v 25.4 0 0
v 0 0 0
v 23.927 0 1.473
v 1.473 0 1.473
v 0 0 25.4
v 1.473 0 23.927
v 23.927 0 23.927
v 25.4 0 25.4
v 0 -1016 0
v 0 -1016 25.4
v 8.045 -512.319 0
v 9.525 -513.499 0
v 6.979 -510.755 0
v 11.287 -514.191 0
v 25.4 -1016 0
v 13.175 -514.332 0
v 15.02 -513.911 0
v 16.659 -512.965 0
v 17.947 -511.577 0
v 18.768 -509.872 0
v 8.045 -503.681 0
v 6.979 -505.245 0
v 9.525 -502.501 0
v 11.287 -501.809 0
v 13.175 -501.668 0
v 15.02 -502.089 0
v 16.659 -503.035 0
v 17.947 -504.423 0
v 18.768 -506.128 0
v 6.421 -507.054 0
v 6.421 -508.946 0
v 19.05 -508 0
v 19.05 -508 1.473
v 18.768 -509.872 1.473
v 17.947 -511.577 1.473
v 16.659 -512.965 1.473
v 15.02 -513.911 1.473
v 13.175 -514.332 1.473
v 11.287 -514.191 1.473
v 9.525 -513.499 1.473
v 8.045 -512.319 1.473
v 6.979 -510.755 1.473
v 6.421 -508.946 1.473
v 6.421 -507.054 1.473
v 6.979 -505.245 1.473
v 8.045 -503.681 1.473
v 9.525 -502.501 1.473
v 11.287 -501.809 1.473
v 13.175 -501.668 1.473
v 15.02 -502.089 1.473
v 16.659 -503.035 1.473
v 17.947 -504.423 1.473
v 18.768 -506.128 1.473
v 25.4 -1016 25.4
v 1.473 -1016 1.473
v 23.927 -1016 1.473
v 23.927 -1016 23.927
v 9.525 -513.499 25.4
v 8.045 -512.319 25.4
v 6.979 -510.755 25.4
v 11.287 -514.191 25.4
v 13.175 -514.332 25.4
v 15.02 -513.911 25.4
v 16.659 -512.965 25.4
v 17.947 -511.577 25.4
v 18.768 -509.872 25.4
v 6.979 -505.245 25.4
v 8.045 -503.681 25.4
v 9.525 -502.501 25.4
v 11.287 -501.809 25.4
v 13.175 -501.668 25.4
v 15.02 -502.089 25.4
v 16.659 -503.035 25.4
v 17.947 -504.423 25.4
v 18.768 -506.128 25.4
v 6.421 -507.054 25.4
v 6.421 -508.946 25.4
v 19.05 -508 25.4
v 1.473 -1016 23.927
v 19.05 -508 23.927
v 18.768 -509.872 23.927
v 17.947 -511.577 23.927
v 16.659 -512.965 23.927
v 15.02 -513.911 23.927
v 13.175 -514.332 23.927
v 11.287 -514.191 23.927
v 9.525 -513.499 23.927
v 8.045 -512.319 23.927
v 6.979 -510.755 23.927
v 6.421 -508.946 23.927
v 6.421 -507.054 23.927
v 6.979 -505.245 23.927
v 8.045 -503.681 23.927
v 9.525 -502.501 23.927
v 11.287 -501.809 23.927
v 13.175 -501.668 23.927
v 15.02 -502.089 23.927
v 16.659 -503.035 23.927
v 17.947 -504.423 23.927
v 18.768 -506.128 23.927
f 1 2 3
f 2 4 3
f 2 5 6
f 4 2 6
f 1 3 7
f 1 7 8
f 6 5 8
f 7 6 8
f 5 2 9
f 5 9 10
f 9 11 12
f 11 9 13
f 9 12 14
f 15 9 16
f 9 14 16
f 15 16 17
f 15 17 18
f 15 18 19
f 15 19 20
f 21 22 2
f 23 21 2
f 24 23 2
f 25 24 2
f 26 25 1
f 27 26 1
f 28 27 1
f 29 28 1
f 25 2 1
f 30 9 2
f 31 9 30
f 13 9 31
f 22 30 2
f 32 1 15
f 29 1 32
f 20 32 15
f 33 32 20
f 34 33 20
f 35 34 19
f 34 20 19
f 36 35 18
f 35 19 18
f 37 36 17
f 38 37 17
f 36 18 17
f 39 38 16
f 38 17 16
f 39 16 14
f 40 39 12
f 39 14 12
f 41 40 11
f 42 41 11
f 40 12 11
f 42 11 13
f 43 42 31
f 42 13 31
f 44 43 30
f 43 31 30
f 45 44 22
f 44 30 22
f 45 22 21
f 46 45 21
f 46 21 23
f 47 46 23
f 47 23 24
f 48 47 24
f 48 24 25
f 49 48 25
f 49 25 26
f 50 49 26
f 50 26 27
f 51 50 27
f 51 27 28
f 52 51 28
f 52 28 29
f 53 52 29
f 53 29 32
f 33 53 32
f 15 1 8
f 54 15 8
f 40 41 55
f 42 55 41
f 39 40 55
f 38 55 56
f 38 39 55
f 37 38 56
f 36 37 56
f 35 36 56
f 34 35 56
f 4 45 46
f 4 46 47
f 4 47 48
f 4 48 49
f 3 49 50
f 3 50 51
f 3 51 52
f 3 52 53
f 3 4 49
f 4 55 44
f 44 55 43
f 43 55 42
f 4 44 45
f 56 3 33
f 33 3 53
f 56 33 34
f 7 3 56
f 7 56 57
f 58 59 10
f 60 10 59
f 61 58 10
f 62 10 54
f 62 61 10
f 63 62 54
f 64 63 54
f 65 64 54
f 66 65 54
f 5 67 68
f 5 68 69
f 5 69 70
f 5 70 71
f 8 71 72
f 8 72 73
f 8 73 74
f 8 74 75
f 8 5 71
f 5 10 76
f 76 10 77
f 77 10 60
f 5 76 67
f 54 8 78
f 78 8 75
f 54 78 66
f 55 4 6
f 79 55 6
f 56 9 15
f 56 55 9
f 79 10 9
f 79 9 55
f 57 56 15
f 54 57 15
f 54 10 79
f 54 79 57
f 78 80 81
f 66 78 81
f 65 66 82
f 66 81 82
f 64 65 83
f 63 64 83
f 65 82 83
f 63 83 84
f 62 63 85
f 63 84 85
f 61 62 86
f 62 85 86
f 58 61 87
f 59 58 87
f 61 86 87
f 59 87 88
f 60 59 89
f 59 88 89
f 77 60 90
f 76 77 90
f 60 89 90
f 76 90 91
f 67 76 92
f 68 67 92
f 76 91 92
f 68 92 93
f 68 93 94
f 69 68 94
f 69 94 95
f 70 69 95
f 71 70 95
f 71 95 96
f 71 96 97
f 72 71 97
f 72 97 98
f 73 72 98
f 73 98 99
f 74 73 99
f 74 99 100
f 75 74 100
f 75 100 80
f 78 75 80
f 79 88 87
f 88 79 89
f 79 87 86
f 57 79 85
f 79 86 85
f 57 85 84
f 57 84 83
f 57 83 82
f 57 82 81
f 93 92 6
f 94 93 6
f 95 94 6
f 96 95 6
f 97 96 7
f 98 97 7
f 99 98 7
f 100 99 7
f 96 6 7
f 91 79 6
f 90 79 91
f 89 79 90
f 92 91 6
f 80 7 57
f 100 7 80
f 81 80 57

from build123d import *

# Parameters (mm, degrees)
F0_W     = 25.4
F0_H     = 25.4
F0_W_2   = 22.4536
F0_H_2   = 22.4536
F1_DEPTH = 1016
F2_R     = 6.35
F3_DEPTH = 25.401


with BuildPart() as f1:
    # F0 (on Front) → F1 (new body)
    with BuildSketch(Plane.XZ):
        with Locations((12.7, 12.7)):
            Rectangle(F0_W, F0_H)
        with Locations((12.7, 12.7)):
            Rectangle(F0_W_2, F0_H_2, mode=Mode.SUBTRACT)
    extrude(amount=F1_DEPTH)

    # F2 (on face) → F3 (cut, through all)
    with BuildSketch(Plane(origin=(0, 0, 0), x_dir=(1, 0, 0), z_dir=(0, 0, -1))):
        with Locations((12.7, 508)):
            Circle(F2_R)
    extrude(amount=-F3_DEPTH, mode=Mode.SUBTRACT)


solid = f1.part
